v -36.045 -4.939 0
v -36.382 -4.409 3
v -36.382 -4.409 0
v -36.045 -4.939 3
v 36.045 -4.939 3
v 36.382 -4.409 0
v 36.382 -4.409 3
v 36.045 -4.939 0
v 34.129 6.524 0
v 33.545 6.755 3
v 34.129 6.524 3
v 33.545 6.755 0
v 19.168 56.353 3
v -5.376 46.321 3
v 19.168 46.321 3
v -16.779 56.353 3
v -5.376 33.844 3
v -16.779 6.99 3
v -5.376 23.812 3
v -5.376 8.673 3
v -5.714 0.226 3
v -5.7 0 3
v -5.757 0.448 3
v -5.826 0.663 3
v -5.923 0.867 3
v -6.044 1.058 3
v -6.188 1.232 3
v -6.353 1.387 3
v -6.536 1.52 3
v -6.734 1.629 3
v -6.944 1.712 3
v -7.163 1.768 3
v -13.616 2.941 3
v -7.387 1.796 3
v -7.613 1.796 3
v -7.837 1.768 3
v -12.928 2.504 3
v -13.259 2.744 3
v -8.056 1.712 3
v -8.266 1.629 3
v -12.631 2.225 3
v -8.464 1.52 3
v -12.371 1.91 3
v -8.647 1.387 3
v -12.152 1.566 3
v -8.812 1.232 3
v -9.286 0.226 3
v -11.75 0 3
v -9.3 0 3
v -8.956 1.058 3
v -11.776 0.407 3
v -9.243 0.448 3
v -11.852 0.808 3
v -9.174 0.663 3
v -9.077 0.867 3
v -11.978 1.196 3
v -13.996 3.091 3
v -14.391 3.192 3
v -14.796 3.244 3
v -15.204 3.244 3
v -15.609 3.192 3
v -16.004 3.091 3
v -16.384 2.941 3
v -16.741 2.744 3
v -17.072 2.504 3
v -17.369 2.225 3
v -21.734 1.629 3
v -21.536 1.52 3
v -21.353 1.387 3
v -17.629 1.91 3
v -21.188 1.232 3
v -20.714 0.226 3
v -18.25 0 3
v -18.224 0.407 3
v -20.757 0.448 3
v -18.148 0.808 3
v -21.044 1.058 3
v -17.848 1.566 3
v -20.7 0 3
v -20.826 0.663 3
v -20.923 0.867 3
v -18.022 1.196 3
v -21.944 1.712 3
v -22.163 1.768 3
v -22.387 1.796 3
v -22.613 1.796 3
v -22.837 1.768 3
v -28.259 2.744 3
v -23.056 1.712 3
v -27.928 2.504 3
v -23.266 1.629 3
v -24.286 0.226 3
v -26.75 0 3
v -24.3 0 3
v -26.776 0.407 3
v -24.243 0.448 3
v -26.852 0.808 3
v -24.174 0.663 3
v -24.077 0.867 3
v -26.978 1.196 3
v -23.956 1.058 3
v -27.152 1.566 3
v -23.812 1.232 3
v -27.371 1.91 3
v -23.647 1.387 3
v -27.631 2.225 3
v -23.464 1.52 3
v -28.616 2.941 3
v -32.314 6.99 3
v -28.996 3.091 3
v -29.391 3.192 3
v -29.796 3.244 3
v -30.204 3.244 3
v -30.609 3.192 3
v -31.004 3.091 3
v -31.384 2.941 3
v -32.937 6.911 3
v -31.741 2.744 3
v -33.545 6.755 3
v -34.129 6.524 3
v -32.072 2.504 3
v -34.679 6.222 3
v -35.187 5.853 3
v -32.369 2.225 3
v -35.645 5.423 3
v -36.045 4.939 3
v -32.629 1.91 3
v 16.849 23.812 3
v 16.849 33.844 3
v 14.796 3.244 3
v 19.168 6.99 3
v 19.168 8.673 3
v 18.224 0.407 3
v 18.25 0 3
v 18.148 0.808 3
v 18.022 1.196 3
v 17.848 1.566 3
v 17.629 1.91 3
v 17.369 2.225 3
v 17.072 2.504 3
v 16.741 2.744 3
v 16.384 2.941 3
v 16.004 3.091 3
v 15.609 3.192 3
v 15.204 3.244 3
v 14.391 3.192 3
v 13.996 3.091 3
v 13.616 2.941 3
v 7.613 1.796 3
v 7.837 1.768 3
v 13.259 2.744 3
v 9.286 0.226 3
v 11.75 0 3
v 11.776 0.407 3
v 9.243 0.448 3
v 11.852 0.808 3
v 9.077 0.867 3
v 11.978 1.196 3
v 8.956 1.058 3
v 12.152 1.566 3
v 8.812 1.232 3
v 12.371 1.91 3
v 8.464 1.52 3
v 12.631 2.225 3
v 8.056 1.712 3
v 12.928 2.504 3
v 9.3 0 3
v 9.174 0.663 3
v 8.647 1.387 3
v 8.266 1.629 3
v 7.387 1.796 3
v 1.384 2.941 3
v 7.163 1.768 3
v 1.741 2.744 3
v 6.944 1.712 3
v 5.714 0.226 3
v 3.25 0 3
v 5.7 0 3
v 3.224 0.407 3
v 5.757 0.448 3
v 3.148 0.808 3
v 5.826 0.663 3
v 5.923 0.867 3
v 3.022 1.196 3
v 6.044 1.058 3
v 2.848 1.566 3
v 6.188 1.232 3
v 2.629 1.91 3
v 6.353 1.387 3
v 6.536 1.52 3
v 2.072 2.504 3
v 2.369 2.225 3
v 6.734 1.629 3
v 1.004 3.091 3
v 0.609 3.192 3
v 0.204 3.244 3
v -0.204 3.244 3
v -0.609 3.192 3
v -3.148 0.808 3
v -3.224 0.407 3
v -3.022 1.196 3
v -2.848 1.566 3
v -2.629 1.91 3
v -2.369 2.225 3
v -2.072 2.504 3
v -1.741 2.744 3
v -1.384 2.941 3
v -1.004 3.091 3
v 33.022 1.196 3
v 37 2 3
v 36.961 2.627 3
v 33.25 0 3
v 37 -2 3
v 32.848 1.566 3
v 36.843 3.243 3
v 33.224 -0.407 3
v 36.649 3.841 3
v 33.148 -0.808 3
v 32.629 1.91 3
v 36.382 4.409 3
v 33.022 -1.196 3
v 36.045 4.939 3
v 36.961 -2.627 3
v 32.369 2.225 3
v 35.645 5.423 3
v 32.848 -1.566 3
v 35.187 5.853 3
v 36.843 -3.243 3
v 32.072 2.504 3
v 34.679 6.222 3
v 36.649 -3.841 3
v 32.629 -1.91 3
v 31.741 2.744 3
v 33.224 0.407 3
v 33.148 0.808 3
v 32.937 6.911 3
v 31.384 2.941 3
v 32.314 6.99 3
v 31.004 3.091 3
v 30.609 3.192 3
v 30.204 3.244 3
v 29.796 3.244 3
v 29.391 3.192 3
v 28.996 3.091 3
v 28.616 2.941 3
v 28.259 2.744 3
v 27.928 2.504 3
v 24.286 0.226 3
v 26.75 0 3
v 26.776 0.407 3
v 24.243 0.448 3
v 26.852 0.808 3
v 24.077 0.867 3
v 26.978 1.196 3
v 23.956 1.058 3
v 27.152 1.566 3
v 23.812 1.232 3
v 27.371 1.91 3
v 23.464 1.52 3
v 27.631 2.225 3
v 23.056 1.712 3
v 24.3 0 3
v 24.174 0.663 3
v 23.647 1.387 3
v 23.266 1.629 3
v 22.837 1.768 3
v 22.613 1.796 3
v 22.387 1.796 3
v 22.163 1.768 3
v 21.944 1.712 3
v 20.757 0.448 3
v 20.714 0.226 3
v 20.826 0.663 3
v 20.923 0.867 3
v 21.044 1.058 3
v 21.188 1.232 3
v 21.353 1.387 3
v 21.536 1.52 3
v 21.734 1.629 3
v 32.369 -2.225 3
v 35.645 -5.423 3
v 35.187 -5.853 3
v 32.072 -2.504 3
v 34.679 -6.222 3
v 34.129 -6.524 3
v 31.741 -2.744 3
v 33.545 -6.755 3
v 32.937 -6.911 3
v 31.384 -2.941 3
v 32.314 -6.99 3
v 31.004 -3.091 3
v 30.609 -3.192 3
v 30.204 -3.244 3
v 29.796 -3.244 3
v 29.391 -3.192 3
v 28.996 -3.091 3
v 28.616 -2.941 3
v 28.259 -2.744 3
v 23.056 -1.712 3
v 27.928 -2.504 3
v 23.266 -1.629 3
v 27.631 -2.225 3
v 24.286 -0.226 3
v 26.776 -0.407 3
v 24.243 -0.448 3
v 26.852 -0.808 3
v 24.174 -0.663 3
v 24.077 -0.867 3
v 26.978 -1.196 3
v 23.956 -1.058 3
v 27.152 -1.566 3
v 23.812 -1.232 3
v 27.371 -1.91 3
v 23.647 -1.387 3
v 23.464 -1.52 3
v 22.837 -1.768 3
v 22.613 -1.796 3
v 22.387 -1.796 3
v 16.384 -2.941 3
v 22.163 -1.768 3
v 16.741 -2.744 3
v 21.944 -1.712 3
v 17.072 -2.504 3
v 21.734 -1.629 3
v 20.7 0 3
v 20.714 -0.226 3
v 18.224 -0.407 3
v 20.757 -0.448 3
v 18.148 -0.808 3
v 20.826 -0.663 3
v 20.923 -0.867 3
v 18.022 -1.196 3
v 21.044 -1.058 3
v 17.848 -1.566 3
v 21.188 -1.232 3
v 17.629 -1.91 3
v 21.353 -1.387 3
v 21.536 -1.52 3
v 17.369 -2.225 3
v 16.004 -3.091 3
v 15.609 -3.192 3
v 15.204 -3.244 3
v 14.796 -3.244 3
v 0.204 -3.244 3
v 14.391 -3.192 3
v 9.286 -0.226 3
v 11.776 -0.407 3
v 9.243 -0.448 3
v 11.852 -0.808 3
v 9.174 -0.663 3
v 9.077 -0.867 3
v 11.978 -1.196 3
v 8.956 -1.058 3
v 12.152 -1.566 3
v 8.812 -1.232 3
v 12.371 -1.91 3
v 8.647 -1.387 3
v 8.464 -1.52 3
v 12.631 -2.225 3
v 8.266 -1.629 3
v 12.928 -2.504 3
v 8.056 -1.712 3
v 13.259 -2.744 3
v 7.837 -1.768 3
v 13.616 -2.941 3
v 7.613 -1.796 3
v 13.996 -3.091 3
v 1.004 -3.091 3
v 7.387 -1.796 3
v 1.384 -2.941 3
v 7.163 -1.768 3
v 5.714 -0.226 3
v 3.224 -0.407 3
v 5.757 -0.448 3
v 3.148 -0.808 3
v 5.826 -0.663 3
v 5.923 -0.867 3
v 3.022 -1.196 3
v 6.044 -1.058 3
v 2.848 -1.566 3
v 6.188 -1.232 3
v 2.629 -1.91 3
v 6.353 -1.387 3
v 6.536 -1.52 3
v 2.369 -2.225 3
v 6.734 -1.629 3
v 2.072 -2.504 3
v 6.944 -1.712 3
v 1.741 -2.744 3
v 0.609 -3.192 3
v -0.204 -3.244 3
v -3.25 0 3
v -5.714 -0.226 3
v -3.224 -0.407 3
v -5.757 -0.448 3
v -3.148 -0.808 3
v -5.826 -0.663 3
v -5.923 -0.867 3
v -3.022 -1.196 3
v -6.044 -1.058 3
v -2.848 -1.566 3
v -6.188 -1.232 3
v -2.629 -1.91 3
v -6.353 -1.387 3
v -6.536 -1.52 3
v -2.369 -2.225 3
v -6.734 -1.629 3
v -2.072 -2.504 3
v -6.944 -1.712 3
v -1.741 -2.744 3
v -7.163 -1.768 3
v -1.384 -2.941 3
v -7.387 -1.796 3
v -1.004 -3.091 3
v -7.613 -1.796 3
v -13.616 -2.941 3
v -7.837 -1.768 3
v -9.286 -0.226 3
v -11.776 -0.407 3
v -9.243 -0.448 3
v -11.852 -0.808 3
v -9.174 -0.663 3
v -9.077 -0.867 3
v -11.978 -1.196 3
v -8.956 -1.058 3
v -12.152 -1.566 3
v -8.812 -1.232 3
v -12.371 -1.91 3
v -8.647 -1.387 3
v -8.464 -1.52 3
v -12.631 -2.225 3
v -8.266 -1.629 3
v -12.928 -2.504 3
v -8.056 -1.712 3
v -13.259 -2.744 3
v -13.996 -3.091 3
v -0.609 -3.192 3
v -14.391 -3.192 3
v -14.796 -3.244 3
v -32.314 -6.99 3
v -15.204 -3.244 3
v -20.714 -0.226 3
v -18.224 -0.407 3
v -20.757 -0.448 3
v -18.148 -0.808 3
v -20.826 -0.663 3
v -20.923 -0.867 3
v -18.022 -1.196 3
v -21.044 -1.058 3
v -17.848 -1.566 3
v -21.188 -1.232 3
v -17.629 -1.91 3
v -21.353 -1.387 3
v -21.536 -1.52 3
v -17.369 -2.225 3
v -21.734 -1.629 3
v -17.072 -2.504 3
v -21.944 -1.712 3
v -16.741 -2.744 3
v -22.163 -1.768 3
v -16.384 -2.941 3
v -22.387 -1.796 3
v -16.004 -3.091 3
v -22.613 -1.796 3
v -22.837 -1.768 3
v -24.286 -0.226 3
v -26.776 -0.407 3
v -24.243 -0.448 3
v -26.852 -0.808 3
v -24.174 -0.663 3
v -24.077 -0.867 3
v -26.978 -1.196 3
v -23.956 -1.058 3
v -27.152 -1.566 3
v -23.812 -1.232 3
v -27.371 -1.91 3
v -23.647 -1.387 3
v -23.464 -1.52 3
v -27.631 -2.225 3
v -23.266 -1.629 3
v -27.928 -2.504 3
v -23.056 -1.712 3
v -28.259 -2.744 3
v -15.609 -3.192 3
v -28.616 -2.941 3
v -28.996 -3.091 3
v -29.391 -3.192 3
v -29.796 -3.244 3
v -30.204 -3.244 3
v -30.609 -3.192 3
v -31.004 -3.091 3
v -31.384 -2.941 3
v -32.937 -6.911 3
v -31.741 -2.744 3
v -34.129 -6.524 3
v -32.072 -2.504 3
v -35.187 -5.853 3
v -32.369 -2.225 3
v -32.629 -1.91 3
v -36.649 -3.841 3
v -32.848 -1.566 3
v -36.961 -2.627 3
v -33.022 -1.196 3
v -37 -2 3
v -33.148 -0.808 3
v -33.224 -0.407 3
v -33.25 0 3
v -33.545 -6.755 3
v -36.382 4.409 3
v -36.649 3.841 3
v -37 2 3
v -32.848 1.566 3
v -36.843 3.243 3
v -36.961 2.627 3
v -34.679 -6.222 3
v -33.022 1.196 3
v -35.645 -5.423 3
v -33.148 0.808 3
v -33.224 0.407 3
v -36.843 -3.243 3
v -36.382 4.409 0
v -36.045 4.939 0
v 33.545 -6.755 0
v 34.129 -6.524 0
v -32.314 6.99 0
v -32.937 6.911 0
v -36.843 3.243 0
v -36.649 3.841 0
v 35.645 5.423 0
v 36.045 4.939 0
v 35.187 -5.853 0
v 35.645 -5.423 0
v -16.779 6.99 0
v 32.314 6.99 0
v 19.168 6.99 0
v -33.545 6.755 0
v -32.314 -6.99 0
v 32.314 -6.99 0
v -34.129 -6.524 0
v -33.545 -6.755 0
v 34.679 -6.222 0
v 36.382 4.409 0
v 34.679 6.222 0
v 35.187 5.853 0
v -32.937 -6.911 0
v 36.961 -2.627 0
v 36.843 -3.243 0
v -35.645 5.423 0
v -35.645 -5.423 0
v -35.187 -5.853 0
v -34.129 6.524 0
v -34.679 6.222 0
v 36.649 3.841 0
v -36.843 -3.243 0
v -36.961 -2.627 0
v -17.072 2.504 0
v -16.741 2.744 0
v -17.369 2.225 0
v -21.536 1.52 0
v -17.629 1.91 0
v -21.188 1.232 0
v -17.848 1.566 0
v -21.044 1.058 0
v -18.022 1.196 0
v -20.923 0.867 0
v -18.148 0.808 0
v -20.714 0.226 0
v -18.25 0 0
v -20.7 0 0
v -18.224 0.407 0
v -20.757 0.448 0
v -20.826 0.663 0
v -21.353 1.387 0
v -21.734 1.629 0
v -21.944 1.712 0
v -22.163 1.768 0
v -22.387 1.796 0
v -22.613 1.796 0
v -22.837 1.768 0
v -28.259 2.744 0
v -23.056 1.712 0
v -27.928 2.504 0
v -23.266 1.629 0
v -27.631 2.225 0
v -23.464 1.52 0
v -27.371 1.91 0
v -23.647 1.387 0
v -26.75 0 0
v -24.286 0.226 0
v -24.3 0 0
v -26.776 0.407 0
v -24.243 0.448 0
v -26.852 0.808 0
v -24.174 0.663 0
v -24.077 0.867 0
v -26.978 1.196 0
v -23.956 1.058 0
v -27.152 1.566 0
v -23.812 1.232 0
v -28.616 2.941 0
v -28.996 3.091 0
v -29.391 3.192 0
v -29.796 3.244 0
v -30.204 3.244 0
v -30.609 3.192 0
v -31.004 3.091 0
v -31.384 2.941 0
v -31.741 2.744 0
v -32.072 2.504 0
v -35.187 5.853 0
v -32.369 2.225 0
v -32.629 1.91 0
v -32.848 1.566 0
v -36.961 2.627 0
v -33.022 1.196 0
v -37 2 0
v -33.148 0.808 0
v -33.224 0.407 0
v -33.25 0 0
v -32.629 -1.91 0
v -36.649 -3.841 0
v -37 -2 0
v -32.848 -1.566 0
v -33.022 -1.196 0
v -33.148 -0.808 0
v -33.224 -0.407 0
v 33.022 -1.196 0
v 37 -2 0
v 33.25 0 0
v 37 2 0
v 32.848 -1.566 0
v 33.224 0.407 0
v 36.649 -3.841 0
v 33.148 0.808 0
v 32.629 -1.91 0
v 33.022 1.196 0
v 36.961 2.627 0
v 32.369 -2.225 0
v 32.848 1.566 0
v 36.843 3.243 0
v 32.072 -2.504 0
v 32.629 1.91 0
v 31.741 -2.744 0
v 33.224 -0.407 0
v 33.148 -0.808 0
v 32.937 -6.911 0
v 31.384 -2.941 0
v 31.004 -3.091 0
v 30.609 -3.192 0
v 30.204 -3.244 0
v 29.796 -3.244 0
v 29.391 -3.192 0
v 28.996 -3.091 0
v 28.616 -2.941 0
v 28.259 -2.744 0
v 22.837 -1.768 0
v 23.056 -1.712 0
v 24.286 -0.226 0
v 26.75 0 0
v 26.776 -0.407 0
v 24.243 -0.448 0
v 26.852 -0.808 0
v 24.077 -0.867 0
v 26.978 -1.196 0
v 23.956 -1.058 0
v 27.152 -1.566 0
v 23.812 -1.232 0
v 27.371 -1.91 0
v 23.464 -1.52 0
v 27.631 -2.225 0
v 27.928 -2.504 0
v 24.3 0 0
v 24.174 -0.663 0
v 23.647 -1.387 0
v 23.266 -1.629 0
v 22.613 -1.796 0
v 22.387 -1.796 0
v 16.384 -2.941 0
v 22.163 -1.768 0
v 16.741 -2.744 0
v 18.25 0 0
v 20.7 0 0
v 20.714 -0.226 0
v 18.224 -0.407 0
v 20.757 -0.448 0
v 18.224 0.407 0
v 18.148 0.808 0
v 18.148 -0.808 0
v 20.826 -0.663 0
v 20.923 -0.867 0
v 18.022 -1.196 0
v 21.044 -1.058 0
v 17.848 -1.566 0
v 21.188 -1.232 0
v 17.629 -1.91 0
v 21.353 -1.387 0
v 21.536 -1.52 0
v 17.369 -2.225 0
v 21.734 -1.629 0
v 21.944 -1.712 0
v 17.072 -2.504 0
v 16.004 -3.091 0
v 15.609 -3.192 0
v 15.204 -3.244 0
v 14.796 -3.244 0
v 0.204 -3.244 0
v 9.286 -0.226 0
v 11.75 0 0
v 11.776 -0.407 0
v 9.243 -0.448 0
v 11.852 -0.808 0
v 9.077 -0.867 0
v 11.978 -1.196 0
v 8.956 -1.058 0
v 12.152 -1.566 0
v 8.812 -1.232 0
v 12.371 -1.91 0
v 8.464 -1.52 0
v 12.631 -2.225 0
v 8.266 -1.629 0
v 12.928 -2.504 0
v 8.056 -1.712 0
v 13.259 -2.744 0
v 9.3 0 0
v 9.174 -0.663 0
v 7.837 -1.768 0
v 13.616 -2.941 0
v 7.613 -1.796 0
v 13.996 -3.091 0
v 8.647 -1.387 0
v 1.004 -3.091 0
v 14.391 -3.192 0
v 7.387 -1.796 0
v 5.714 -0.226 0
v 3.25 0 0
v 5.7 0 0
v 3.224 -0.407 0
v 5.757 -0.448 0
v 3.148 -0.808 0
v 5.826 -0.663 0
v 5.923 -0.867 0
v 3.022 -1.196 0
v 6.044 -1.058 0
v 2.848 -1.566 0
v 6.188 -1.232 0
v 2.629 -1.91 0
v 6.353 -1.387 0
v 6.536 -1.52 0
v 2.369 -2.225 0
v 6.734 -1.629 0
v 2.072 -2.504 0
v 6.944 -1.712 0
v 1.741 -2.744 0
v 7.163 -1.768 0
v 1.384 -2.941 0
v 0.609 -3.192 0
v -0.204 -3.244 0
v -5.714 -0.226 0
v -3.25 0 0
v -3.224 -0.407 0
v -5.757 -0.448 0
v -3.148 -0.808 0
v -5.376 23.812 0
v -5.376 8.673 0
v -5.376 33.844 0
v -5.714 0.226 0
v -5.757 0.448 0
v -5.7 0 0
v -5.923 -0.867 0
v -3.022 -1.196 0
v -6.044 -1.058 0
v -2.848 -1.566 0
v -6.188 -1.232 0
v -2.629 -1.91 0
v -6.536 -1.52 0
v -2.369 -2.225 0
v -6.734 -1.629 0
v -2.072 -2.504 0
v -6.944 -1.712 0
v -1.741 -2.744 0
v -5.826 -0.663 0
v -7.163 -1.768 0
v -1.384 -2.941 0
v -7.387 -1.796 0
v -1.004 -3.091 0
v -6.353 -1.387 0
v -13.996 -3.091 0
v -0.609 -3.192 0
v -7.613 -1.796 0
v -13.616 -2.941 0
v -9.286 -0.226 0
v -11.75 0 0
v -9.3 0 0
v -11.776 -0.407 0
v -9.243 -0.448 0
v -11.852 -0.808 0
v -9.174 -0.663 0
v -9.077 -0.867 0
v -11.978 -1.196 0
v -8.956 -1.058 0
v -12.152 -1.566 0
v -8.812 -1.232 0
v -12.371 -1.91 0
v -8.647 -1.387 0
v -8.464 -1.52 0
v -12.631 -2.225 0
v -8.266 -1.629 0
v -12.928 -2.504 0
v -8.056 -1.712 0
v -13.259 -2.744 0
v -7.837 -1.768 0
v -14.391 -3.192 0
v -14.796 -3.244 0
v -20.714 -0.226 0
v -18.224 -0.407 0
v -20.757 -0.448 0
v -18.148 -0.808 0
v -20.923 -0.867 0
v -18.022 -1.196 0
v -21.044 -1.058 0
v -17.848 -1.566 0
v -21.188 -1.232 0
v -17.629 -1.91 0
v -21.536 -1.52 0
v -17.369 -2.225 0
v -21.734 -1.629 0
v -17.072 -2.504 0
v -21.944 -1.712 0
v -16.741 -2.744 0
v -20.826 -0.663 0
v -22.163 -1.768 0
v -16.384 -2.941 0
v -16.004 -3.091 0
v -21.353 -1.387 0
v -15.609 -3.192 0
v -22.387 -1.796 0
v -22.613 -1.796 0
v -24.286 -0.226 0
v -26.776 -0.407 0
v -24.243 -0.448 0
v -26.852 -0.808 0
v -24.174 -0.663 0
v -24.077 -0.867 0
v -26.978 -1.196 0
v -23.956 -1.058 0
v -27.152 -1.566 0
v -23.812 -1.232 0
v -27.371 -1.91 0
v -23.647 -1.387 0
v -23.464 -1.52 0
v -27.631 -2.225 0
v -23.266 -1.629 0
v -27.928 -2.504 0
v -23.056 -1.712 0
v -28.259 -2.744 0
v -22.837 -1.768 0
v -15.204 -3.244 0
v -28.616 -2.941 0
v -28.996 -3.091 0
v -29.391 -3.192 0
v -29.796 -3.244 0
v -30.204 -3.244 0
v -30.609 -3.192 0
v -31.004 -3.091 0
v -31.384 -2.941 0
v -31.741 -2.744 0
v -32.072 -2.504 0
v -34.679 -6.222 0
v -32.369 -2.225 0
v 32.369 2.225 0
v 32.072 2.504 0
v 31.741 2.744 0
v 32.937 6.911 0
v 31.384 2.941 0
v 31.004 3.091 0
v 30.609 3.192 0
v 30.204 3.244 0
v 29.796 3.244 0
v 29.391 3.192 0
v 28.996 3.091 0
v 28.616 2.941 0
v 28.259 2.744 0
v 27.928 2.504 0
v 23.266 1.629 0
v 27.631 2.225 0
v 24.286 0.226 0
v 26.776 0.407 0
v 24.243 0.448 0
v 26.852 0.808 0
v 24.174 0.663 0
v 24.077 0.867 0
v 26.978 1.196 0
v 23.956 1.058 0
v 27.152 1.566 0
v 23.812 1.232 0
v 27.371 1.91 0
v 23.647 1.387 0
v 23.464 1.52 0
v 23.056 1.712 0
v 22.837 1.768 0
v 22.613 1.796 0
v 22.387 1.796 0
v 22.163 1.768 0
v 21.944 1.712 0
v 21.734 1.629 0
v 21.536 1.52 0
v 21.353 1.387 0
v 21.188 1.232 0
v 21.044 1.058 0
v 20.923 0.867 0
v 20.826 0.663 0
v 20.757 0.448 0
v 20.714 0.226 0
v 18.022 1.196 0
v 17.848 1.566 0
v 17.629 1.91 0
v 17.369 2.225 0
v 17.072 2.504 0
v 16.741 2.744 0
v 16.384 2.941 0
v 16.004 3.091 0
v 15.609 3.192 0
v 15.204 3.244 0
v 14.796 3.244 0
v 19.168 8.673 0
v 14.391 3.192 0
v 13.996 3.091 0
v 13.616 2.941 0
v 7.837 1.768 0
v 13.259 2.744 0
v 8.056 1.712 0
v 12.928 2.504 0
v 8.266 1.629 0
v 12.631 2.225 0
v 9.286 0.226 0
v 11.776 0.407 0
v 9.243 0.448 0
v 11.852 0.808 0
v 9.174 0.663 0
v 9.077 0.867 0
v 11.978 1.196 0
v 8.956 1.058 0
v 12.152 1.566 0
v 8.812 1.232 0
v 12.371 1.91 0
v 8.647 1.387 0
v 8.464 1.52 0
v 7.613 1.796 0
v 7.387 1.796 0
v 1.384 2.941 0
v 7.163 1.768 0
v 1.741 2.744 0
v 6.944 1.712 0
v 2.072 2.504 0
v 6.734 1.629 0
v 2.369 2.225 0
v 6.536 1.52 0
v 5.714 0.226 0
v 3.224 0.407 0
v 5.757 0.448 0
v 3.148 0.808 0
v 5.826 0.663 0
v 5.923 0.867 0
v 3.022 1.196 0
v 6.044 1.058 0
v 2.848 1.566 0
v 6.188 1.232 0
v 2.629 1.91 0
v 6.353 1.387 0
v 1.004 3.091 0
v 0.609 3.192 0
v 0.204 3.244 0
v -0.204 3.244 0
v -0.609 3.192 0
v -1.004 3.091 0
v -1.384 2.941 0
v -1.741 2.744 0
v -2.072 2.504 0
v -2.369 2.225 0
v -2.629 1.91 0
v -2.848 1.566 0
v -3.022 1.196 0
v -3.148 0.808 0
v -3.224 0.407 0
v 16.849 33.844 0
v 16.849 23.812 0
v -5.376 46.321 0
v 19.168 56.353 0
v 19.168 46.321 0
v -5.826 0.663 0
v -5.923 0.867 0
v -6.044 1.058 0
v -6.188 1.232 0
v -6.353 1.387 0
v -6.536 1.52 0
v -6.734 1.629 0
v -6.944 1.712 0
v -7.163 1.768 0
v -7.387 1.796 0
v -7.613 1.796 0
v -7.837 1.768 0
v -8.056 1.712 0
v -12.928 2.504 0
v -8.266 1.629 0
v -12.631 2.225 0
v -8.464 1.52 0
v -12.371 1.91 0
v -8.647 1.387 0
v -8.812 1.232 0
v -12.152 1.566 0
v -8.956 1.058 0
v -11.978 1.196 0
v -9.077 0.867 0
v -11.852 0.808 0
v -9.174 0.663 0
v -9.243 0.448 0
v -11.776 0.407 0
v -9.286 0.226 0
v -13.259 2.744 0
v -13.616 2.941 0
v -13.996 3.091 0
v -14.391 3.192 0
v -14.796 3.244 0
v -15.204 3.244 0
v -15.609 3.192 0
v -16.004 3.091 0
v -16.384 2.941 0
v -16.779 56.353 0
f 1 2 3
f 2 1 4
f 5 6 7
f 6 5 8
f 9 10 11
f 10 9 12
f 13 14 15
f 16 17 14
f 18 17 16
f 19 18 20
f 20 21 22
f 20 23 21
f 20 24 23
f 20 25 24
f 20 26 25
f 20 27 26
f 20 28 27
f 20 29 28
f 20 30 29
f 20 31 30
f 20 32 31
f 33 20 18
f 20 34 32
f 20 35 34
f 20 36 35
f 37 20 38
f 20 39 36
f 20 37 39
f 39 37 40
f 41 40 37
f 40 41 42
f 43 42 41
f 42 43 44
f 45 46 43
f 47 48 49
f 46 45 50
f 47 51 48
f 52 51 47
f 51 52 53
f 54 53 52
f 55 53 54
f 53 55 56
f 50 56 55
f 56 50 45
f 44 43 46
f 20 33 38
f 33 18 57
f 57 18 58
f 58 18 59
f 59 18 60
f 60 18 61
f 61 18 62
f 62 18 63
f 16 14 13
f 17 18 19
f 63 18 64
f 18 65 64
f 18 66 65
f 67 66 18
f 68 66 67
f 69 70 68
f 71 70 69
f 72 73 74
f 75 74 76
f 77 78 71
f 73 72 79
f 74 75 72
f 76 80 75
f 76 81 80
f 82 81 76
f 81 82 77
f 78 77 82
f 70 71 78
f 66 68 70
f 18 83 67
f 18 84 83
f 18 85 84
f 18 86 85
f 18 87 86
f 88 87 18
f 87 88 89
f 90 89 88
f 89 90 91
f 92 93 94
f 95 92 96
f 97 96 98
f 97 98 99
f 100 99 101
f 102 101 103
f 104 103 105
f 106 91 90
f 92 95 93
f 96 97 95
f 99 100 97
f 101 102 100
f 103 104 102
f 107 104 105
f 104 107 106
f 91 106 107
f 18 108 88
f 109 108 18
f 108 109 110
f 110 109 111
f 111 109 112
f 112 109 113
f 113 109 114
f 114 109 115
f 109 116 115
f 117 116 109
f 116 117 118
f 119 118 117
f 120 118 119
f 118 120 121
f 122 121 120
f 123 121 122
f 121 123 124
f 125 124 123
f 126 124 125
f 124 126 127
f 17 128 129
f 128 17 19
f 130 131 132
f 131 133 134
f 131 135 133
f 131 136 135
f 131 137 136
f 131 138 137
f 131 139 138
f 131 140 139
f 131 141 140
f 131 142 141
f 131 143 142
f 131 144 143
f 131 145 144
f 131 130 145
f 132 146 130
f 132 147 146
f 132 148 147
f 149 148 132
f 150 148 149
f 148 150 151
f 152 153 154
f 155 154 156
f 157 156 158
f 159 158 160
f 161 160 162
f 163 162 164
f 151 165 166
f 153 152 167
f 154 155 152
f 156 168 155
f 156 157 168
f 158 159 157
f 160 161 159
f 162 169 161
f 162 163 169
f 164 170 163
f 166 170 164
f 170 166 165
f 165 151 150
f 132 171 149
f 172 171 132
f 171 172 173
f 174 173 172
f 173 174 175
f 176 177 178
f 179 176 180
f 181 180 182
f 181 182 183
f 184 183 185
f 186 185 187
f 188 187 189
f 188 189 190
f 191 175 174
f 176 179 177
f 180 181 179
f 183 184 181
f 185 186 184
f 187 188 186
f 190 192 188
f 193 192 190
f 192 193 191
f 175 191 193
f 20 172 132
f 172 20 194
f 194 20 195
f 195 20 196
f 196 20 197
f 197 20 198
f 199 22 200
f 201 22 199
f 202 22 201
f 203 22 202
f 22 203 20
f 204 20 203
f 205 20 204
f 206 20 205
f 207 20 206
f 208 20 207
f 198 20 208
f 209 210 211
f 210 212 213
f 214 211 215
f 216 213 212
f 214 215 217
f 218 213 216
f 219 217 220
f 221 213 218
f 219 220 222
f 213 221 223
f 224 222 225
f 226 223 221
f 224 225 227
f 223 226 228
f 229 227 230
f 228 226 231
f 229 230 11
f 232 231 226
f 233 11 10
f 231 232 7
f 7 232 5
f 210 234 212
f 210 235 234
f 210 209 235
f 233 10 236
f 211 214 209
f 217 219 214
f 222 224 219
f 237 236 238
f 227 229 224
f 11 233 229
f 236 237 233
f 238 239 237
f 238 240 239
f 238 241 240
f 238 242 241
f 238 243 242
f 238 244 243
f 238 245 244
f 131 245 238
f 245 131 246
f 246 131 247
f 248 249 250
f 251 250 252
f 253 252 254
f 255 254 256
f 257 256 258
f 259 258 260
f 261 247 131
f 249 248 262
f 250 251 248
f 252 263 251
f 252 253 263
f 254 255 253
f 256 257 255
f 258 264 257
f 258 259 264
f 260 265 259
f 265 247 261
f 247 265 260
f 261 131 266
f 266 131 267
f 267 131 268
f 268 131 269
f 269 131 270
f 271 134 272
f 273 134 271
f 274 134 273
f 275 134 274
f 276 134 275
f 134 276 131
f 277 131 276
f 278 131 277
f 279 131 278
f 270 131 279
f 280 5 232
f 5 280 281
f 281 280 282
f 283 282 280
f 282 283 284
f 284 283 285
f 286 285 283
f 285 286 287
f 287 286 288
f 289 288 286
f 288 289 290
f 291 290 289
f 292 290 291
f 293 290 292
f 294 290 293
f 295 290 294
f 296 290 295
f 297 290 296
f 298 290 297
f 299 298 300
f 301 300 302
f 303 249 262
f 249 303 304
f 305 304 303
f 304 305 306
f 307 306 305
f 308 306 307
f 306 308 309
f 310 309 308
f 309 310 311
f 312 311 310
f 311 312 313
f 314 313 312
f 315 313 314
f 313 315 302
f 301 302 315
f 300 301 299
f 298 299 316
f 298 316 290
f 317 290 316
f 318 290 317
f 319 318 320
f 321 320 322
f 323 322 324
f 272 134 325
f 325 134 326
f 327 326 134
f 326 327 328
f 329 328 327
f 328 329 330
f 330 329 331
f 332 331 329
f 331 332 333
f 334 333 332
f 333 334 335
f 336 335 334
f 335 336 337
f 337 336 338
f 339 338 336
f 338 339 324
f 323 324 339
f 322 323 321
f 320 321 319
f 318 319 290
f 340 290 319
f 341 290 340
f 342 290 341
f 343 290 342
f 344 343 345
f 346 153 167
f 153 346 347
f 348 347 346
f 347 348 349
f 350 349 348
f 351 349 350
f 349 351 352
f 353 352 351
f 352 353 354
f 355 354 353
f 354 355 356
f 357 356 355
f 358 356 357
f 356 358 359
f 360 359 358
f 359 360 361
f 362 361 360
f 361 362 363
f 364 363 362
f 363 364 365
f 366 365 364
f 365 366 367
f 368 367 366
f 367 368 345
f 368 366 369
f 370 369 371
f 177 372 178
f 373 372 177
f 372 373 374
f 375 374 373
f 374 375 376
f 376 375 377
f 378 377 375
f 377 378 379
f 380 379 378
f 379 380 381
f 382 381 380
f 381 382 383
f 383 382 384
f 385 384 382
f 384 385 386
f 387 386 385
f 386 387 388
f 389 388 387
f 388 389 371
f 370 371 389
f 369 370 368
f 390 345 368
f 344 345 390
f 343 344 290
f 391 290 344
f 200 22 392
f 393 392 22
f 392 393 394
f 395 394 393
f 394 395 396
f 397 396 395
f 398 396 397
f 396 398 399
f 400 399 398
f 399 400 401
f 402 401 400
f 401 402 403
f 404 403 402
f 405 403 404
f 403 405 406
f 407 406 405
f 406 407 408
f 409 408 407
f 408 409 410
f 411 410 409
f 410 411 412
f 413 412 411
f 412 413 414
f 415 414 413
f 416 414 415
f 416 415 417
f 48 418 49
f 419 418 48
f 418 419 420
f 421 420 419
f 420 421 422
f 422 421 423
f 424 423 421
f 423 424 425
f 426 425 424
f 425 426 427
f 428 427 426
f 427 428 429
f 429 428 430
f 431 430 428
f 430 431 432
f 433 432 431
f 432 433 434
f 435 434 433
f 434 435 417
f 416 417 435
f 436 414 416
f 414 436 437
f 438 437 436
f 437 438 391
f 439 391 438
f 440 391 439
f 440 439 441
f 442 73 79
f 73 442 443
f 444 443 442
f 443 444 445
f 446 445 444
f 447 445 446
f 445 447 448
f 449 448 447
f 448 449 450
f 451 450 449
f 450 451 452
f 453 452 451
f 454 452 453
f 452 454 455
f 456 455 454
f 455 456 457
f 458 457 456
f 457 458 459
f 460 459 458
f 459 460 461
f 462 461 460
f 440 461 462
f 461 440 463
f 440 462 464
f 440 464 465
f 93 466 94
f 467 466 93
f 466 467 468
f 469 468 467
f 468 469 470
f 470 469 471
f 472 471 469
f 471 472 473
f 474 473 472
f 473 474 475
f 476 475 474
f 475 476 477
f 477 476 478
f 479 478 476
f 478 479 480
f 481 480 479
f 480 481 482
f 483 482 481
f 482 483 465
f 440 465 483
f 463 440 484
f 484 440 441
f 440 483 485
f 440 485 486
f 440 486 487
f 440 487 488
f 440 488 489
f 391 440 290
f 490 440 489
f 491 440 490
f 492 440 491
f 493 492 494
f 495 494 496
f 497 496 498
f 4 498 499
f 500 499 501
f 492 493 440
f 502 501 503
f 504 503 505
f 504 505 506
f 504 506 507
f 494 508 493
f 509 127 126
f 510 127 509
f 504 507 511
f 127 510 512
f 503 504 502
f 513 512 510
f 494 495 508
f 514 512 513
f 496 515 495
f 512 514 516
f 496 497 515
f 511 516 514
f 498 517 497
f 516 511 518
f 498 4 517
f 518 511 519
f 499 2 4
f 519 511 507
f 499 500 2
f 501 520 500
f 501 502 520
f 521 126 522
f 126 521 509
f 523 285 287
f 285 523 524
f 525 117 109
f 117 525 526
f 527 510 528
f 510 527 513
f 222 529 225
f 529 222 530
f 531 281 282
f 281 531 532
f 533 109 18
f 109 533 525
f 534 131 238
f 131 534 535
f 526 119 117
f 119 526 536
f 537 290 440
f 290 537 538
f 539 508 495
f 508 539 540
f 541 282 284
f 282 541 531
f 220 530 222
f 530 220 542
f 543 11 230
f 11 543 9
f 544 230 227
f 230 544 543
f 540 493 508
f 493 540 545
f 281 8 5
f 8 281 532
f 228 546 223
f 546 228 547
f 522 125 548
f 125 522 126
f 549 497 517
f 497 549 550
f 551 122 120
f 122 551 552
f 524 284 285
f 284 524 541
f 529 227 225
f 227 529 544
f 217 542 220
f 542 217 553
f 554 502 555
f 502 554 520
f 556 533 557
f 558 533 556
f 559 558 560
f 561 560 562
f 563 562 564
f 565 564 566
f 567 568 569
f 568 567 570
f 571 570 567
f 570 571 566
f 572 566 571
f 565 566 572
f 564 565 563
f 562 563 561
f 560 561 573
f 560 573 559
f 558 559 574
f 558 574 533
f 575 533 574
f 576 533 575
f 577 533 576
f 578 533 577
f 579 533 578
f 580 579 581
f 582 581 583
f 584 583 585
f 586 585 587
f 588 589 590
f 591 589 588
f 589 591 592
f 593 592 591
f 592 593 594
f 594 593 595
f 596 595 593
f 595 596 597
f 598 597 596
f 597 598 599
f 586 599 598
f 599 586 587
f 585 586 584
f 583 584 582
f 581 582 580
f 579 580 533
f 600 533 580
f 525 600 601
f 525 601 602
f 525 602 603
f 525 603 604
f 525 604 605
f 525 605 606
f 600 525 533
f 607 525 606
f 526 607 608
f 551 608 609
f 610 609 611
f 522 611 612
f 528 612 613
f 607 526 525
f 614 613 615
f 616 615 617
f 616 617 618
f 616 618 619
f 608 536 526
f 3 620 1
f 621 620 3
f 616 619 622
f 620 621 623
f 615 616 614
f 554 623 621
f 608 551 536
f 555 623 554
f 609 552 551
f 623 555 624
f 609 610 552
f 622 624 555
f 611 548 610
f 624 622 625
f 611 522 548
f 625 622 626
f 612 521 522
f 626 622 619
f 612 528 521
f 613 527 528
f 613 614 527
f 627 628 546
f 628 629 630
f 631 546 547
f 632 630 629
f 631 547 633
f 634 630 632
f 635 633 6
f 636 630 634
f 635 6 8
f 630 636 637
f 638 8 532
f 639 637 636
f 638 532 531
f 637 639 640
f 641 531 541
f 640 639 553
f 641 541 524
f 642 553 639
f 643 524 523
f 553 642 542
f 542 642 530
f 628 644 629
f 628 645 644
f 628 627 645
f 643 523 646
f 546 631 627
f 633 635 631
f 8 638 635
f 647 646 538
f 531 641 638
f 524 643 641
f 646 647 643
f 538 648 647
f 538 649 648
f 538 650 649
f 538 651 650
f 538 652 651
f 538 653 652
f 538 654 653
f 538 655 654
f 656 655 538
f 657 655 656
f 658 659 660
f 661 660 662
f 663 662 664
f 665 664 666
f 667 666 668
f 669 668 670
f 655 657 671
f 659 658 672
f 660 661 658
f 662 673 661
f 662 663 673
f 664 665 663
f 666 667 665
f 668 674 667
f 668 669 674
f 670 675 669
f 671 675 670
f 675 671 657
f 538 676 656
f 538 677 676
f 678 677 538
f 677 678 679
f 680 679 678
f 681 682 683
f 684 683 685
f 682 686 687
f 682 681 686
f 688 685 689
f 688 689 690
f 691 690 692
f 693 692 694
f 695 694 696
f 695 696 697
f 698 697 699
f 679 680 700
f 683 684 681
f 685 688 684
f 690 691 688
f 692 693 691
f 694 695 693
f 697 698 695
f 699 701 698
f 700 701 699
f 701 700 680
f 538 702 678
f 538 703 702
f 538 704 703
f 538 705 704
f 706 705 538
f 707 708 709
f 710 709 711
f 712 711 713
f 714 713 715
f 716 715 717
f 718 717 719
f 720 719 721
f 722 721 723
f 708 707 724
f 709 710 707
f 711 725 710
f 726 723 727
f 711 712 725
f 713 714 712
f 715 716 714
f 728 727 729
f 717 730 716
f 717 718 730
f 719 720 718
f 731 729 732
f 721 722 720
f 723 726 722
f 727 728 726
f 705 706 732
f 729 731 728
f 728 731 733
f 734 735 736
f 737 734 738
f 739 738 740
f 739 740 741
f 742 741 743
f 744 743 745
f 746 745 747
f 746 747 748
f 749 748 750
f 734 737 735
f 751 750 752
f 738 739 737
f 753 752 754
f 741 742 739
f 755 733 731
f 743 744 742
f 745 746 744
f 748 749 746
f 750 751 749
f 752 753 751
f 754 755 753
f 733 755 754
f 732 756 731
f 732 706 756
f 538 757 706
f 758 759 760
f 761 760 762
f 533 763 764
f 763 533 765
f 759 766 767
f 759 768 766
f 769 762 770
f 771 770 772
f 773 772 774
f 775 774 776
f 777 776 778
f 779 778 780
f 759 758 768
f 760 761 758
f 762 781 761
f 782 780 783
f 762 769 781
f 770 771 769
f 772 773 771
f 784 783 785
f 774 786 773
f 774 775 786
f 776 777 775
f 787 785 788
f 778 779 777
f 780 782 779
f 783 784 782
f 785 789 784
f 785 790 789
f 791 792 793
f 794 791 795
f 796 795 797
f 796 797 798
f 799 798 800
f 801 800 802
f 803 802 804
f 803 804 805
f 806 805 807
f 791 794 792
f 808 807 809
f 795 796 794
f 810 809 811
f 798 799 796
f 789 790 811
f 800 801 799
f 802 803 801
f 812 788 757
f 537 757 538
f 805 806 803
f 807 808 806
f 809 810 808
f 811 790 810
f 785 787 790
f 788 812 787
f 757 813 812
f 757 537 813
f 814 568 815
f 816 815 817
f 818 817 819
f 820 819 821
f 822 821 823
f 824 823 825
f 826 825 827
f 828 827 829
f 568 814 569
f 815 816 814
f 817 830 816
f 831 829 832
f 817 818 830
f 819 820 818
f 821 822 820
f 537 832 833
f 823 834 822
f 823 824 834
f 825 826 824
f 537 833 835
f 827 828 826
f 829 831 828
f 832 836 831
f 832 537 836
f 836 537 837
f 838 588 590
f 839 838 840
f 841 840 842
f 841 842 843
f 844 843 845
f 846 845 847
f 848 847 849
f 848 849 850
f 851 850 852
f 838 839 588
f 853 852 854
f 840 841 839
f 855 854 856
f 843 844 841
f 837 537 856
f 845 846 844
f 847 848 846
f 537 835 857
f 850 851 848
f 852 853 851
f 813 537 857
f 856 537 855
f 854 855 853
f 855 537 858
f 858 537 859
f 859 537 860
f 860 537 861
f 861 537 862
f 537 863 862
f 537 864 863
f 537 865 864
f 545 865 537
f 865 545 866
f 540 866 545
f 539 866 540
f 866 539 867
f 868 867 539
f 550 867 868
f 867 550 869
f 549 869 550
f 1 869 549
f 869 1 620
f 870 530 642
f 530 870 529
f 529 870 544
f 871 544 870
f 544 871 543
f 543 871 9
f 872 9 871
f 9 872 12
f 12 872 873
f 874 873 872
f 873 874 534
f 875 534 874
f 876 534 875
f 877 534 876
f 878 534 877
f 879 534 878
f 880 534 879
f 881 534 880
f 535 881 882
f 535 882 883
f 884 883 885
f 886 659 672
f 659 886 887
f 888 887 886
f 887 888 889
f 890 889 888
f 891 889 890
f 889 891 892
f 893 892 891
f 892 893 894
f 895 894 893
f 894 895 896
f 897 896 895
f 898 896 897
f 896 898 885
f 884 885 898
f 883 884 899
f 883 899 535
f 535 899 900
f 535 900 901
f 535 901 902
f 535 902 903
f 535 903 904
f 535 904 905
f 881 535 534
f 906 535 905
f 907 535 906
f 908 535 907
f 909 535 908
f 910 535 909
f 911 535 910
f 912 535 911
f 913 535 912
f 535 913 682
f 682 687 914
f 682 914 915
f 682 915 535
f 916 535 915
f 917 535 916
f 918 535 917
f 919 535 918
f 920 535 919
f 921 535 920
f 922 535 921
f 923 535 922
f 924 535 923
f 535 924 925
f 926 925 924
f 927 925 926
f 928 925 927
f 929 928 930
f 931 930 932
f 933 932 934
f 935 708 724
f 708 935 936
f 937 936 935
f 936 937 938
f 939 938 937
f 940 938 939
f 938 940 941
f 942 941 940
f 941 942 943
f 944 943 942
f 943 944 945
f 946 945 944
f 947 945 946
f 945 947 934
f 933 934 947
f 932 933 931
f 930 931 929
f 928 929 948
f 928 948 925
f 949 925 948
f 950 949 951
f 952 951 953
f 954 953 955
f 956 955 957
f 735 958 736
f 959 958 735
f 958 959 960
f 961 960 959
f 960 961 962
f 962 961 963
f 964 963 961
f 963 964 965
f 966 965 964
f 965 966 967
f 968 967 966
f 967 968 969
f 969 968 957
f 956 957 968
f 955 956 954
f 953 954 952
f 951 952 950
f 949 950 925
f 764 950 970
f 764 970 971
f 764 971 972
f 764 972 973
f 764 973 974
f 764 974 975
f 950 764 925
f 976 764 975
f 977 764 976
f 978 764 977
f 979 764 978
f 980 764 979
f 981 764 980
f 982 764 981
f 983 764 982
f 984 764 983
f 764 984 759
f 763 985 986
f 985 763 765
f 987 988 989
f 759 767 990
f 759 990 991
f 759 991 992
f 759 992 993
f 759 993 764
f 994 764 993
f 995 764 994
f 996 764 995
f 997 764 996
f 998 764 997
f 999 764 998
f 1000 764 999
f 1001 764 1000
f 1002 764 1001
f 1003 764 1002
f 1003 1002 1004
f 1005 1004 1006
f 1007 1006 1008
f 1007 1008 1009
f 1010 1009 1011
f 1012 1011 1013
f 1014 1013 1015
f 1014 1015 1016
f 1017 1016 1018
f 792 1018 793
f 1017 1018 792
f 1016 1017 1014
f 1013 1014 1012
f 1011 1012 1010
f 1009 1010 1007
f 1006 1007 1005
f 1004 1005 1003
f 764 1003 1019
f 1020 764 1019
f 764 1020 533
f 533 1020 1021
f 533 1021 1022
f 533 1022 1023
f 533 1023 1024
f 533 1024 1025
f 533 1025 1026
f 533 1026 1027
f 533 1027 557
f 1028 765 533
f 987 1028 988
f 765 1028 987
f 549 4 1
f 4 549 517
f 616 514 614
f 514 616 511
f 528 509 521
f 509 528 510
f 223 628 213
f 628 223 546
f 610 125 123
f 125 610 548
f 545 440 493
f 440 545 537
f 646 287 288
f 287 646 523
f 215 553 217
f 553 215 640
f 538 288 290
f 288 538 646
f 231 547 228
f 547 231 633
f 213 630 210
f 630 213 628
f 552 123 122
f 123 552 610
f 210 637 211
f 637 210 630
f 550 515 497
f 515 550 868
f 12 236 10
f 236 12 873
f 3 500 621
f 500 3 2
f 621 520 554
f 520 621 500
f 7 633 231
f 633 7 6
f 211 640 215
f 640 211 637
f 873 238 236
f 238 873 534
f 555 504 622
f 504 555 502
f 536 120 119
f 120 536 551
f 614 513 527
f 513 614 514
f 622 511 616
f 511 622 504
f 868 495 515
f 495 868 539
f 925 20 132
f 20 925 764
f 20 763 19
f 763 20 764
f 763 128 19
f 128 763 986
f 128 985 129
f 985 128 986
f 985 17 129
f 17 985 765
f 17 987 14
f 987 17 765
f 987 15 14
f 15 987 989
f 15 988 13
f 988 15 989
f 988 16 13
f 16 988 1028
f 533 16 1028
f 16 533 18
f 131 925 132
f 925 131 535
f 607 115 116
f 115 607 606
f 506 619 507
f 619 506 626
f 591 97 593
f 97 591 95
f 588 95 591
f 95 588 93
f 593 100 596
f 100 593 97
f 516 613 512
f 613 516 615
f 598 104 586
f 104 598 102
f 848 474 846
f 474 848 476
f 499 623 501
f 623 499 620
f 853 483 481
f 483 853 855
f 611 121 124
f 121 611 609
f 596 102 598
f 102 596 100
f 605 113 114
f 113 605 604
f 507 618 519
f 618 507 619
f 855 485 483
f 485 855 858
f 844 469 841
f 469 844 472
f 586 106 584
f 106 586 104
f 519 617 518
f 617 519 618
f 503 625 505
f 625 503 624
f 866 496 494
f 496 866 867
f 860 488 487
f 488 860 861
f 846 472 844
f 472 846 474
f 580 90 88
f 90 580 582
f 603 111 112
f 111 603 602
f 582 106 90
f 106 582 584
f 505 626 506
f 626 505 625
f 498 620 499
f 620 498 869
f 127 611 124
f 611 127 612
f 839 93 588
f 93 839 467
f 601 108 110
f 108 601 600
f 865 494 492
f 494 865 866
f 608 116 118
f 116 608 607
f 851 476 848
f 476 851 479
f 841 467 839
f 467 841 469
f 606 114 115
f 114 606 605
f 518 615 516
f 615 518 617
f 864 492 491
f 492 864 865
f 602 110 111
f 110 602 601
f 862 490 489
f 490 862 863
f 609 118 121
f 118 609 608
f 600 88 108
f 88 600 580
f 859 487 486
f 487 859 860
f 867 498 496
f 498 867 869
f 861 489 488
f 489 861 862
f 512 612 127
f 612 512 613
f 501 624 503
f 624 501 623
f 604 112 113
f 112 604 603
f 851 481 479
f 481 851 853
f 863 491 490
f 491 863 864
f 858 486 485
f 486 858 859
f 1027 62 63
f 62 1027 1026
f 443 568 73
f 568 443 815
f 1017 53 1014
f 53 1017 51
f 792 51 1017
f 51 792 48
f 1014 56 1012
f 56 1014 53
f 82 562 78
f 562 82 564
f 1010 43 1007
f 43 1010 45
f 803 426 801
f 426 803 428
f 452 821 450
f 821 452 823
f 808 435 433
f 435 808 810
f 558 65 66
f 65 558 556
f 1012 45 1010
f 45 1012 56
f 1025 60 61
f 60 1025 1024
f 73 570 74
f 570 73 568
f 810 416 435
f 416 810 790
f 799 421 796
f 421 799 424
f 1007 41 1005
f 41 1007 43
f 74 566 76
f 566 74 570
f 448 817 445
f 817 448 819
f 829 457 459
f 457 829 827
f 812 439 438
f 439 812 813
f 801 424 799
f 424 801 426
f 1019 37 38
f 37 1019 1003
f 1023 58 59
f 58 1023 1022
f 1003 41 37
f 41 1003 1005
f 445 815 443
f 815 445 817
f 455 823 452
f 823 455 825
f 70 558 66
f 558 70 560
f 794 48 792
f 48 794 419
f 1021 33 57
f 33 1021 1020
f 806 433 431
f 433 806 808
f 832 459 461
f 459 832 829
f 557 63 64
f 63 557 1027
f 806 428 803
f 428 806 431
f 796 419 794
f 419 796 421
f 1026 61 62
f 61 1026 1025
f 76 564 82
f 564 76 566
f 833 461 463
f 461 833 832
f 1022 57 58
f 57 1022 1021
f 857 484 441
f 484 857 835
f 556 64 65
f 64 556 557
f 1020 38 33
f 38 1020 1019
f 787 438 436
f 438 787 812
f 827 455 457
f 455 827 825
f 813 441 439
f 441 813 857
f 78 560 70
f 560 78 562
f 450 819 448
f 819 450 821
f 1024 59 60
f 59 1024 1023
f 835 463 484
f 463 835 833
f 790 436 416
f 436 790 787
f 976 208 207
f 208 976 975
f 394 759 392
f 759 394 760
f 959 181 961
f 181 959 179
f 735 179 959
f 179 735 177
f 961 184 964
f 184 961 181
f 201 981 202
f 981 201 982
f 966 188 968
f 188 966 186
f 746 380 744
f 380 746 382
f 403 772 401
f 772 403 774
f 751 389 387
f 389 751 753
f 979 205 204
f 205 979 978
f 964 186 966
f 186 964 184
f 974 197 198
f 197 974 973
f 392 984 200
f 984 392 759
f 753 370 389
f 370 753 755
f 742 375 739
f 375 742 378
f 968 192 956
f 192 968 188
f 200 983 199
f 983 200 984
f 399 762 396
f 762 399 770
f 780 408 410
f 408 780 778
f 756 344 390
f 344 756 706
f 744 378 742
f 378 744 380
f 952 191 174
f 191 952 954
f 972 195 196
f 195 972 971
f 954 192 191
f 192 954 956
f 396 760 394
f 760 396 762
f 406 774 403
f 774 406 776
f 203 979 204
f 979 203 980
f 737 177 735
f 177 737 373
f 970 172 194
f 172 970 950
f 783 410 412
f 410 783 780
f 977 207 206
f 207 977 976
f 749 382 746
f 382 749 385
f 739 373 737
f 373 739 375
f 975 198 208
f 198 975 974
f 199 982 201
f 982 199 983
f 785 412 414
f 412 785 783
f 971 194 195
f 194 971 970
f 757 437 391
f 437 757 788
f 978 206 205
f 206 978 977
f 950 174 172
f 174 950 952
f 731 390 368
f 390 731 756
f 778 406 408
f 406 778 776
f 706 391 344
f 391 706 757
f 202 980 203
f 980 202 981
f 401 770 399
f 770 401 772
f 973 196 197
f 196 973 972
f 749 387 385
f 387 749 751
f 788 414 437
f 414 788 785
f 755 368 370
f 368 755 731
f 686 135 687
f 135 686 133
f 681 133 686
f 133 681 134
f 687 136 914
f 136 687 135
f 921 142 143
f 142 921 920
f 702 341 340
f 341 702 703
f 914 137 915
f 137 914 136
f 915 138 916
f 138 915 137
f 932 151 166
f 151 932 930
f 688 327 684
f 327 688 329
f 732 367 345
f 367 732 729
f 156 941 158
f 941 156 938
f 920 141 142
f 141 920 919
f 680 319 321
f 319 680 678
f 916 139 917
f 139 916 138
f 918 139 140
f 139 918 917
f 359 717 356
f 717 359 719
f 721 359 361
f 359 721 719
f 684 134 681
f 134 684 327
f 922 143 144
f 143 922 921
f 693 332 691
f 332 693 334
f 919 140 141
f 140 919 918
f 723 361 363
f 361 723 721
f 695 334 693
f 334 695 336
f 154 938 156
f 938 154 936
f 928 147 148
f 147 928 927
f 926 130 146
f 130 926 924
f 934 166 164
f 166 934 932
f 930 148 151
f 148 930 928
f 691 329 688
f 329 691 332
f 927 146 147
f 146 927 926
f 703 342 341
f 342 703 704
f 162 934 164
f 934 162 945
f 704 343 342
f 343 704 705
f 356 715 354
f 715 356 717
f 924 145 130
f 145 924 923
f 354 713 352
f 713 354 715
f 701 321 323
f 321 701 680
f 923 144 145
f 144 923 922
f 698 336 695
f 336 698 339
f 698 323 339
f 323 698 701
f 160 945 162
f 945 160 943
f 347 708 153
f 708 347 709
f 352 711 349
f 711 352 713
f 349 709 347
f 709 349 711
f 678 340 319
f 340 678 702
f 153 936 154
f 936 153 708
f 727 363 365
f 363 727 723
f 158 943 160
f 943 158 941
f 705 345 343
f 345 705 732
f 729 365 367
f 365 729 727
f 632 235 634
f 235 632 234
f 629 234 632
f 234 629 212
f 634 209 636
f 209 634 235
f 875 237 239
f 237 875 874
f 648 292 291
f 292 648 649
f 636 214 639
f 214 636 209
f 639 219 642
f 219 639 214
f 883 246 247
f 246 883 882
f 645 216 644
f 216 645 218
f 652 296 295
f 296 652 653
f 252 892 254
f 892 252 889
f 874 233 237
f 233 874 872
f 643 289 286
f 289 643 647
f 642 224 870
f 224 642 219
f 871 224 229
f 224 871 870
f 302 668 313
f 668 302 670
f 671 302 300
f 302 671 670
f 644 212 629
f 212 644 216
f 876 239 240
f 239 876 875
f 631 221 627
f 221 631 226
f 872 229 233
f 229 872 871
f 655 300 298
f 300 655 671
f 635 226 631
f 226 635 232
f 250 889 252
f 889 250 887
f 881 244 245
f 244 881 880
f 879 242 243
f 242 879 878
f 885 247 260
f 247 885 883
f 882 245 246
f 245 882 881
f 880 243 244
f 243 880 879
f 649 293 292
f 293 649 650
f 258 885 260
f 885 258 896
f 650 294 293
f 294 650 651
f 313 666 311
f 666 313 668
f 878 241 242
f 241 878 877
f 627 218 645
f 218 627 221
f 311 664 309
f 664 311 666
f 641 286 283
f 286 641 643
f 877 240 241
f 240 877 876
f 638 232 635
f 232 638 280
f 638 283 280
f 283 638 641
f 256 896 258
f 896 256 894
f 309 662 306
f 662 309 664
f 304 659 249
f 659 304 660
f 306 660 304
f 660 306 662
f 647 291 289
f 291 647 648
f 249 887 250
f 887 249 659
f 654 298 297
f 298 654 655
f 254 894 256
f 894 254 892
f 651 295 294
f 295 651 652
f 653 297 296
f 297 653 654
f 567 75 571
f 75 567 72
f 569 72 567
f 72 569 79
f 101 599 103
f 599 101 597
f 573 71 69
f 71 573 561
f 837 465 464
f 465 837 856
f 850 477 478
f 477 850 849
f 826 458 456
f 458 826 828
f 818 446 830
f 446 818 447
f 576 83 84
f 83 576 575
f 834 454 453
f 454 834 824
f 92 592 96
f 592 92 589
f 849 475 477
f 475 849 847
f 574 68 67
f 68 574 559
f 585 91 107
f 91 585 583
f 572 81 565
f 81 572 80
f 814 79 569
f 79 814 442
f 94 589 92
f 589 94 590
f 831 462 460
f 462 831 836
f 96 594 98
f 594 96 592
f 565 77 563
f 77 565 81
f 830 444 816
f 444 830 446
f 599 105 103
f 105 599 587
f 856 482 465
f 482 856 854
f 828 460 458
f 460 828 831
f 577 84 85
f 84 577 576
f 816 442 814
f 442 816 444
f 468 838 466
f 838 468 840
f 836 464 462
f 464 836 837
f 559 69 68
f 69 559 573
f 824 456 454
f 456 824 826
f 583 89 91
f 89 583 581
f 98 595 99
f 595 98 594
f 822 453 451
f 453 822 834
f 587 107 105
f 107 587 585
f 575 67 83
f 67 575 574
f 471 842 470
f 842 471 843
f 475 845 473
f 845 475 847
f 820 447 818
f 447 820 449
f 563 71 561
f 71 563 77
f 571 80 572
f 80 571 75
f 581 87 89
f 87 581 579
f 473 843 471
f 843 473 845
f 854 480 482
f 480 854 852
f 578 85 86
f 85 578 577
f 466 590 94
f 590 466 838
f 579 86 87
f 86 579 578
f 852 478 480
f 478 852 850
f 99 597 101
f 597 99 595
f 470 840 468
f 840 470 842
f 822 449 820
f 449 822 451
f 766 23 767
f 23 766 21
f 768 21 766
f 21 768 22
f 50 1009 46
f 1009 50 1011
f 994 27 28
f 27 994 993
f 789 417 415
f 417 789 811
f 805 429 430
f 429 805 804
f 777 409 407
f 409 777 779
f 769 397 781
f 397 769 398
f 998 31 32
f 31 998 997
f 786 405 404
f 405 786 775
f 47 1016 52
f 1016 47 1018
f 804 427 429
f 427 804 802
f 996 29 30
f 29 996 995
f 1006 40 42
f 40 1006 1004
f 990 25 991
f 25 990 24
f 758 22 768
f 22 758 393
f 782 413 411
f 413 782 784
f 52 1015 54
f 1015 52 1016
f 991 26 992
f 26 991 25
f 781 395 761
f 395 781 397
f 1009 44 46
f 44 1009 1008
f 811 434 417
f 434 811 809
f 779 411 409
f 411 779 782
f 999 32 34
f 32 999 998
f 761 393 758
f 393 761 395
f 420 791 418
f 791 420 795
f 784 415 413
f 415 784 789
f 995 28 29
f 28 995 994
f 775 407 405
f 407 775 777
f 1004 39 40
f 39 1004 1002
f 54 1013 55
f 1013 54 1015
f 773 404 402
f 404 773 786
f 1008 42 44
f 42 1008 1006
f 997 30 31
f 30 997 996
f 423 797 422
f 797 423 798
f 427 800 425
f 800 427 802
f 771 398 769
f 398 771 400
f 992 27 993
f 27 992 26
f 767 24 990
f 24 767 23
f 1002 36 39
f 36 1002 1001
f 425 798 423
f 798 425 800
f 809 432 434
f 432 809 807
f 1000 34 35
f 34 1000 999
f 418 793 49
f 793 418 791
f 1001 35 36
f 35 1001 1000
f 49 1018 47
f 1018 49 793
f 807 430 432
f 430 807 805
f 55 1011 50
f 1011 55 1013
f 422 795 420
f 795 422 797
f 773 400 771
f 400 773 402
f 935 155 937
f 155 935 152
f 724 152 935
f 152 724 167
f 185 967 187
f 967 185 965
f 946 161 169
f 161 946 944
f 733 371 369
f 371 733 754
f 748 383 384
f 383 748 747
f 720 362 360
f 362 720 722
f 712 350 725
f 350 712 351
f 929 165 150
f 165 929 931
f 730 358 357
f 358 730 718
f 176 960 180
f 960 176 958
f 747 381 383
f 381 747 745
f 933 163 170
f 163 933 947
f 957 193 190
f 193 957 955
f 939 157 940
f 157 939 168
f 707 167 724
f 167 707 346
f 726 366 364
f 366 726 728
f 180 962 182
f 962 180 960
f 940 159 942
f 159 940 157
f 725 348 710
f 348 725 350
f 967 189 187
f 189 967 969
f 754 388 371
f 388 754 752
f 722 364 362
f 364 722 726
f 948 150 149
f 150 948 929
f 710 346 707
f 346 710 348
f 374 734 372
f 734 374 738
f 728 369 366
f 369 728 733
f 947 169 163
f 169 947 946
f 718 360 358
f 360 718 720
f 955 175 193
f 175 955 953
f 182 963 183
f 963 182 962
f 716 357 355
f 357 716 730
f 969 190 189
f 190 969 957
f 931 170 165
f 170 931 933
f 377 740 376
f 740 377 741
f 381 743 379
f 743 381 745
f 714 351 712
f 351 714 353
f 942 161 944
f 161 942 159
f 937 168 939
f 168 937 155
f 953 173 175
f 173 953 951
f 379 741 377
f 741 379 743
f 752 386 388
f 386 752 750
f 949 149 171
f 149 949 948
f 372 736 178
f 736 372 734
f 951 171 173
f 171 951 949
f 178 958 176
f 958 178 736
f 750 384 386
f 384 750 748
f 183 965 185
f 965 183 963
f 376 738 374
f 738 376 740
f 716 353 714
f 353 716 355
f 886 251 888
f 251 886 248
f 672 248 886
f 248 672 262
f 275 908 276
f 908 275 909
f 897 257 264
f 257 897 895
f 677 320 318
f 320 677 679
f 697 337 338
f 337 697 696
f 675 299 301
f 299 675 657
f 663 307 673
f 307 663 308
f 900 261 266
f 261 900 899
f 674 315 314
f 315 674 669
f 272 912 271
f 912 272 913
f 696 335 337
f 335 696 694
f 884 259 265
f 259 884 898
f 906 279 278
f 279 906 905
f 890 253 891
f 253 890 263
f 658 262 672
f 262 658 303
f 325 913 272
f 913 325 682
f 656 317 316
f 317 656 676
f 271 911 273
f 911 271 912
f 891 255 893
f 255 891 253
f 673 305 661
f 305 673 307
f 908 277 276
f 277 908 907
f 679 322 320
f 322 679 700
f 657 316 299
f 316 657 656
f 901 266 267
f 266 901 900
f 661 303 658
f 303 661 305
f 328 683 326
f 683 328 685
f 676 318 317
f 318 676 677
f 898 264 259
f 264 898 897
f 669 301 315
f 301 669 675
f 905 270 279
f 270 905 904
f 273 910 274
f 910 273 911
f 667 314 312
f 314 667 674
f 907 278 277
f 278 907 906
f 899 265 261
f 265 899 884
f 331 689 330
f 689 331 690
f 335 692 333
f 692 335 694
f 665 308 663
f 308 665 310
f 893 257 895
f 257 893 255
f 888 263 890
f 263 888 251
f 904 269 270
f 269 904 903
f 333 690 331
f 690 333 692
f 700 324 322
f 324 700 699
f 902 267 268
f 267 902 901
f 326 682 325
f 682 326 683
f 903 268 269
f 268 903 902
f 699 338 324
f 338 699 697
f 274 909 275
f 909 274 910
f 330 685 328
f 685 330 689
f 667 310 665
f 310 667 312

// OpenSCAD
$fn = 50;


difference() {
	union() {
		hull() {
			translate(v = [-32.0000000000, 2.0000000000, 0]) {
				cylinder(h = 3, r = 5);
			}
			translate(v = [32.0000000000, 2.0000000000, 0]) {
				cylinder(h = 3, r = 5);
			}
			translate(v = [-32.0000000000, -2.0000000000, 0]) {
				cylinder(h = 3, r = 5);
			}
			translate(v = [32.0000000000, -2.0000000000, 0]) {
				cylinder(h = 3, r = 5);
			}
		}
		translate(v = [0, 55, 0]) {
			linear_extrude(height = 3) {
				text(font = "DejaVu Sans Mono:style=Bold", halign = "center", size = 57.0000000000, text = "E", valign = "top");
			}
		}
	}
	union() {
		translate(v = [-30.0000000000, 0.0000000000, 0]) {
			translate(v = [0, 0, -100]) {
				cylinder(h = 200, r = 3.2500000000);
			}
		}
		translate(v = [-15.0000000000, 0.0000000000, 0]) {
			translate(v = [0, 0, -100]) {
				cylinder(h = 200, r = 3.2500000000);
			}
		}
		translate(v = [0, 0, -100]) {
			cylinder(h = 200, r = 3.2500000000);
		}
		translate(v = [15.0000000000, 0.0000000000, 0]) {
			translate(v = [0, 0, -100]) {
				cylinder(h = 200, r = 3.2500000000);
			}
		}
		translate(v = [30.0000000000, 0.0000000000, 0]) {
			translate(v = [0, 0, -100]) {
				cylinder(h = 200, r = 3.2500000000);
			}
		}
		translate(v = [-30.0000000000, 0.0000000000, 0]) {
			translate(v = [0, 0, -100]) {
				cylinder(h = 200, r = 1.8000000000);
			}
		}
		translate(v = [-22.5000000000, 0.0000000000, 0]) {
			translate(v = [0, 0, -100]) {
				cylinder(h = 200, r = 1.8000000000);
			}
		}
		translate(v = [-15.0000000000, 0.0000000000, 0]) {
			translate(v = [0, 0, -100]) {
				cylinder(h = 200, r = 1.8000000000);
			}
		}
		translate(v = [-7.5000000000, 0.0000000000, 0]) {
			translate(v = [0, 0, -100]) {
				cylinder(h = 200, r = 1.8000000000);
			}
		}
		translate(v = [0, 0, -100]) {
			cylinder(h = 200, r = 1.8000000000);
		}
		translate(v = [7.5000000000, 0.0000000000, 0]) {
			translate(v = [0, 0, -100]) {
				cylinder(h = 200, r = 1.8000000000);
			}
		}
		translate(v = [15.0000000000, 0.0000000000, 0]) {
			translate(v = [0, 0, -100]) {
				cylinder(h = 200, r = 1.8000000000);
			}
		}
		translate(v = [22.5000000000, 0.0000000000, 0]) {
			translate(v = [0, 0, -100]) {
				cylinder(h = 200, r = 1.8000000000);
			}
		}
		translate(v = [30.0000000000, 0.0000000000, 0]) {
			translate(v = [0, 0, -100]) {
				cylinder(h = 200, r = 1.8000000000);
			}
		}
	}
}
